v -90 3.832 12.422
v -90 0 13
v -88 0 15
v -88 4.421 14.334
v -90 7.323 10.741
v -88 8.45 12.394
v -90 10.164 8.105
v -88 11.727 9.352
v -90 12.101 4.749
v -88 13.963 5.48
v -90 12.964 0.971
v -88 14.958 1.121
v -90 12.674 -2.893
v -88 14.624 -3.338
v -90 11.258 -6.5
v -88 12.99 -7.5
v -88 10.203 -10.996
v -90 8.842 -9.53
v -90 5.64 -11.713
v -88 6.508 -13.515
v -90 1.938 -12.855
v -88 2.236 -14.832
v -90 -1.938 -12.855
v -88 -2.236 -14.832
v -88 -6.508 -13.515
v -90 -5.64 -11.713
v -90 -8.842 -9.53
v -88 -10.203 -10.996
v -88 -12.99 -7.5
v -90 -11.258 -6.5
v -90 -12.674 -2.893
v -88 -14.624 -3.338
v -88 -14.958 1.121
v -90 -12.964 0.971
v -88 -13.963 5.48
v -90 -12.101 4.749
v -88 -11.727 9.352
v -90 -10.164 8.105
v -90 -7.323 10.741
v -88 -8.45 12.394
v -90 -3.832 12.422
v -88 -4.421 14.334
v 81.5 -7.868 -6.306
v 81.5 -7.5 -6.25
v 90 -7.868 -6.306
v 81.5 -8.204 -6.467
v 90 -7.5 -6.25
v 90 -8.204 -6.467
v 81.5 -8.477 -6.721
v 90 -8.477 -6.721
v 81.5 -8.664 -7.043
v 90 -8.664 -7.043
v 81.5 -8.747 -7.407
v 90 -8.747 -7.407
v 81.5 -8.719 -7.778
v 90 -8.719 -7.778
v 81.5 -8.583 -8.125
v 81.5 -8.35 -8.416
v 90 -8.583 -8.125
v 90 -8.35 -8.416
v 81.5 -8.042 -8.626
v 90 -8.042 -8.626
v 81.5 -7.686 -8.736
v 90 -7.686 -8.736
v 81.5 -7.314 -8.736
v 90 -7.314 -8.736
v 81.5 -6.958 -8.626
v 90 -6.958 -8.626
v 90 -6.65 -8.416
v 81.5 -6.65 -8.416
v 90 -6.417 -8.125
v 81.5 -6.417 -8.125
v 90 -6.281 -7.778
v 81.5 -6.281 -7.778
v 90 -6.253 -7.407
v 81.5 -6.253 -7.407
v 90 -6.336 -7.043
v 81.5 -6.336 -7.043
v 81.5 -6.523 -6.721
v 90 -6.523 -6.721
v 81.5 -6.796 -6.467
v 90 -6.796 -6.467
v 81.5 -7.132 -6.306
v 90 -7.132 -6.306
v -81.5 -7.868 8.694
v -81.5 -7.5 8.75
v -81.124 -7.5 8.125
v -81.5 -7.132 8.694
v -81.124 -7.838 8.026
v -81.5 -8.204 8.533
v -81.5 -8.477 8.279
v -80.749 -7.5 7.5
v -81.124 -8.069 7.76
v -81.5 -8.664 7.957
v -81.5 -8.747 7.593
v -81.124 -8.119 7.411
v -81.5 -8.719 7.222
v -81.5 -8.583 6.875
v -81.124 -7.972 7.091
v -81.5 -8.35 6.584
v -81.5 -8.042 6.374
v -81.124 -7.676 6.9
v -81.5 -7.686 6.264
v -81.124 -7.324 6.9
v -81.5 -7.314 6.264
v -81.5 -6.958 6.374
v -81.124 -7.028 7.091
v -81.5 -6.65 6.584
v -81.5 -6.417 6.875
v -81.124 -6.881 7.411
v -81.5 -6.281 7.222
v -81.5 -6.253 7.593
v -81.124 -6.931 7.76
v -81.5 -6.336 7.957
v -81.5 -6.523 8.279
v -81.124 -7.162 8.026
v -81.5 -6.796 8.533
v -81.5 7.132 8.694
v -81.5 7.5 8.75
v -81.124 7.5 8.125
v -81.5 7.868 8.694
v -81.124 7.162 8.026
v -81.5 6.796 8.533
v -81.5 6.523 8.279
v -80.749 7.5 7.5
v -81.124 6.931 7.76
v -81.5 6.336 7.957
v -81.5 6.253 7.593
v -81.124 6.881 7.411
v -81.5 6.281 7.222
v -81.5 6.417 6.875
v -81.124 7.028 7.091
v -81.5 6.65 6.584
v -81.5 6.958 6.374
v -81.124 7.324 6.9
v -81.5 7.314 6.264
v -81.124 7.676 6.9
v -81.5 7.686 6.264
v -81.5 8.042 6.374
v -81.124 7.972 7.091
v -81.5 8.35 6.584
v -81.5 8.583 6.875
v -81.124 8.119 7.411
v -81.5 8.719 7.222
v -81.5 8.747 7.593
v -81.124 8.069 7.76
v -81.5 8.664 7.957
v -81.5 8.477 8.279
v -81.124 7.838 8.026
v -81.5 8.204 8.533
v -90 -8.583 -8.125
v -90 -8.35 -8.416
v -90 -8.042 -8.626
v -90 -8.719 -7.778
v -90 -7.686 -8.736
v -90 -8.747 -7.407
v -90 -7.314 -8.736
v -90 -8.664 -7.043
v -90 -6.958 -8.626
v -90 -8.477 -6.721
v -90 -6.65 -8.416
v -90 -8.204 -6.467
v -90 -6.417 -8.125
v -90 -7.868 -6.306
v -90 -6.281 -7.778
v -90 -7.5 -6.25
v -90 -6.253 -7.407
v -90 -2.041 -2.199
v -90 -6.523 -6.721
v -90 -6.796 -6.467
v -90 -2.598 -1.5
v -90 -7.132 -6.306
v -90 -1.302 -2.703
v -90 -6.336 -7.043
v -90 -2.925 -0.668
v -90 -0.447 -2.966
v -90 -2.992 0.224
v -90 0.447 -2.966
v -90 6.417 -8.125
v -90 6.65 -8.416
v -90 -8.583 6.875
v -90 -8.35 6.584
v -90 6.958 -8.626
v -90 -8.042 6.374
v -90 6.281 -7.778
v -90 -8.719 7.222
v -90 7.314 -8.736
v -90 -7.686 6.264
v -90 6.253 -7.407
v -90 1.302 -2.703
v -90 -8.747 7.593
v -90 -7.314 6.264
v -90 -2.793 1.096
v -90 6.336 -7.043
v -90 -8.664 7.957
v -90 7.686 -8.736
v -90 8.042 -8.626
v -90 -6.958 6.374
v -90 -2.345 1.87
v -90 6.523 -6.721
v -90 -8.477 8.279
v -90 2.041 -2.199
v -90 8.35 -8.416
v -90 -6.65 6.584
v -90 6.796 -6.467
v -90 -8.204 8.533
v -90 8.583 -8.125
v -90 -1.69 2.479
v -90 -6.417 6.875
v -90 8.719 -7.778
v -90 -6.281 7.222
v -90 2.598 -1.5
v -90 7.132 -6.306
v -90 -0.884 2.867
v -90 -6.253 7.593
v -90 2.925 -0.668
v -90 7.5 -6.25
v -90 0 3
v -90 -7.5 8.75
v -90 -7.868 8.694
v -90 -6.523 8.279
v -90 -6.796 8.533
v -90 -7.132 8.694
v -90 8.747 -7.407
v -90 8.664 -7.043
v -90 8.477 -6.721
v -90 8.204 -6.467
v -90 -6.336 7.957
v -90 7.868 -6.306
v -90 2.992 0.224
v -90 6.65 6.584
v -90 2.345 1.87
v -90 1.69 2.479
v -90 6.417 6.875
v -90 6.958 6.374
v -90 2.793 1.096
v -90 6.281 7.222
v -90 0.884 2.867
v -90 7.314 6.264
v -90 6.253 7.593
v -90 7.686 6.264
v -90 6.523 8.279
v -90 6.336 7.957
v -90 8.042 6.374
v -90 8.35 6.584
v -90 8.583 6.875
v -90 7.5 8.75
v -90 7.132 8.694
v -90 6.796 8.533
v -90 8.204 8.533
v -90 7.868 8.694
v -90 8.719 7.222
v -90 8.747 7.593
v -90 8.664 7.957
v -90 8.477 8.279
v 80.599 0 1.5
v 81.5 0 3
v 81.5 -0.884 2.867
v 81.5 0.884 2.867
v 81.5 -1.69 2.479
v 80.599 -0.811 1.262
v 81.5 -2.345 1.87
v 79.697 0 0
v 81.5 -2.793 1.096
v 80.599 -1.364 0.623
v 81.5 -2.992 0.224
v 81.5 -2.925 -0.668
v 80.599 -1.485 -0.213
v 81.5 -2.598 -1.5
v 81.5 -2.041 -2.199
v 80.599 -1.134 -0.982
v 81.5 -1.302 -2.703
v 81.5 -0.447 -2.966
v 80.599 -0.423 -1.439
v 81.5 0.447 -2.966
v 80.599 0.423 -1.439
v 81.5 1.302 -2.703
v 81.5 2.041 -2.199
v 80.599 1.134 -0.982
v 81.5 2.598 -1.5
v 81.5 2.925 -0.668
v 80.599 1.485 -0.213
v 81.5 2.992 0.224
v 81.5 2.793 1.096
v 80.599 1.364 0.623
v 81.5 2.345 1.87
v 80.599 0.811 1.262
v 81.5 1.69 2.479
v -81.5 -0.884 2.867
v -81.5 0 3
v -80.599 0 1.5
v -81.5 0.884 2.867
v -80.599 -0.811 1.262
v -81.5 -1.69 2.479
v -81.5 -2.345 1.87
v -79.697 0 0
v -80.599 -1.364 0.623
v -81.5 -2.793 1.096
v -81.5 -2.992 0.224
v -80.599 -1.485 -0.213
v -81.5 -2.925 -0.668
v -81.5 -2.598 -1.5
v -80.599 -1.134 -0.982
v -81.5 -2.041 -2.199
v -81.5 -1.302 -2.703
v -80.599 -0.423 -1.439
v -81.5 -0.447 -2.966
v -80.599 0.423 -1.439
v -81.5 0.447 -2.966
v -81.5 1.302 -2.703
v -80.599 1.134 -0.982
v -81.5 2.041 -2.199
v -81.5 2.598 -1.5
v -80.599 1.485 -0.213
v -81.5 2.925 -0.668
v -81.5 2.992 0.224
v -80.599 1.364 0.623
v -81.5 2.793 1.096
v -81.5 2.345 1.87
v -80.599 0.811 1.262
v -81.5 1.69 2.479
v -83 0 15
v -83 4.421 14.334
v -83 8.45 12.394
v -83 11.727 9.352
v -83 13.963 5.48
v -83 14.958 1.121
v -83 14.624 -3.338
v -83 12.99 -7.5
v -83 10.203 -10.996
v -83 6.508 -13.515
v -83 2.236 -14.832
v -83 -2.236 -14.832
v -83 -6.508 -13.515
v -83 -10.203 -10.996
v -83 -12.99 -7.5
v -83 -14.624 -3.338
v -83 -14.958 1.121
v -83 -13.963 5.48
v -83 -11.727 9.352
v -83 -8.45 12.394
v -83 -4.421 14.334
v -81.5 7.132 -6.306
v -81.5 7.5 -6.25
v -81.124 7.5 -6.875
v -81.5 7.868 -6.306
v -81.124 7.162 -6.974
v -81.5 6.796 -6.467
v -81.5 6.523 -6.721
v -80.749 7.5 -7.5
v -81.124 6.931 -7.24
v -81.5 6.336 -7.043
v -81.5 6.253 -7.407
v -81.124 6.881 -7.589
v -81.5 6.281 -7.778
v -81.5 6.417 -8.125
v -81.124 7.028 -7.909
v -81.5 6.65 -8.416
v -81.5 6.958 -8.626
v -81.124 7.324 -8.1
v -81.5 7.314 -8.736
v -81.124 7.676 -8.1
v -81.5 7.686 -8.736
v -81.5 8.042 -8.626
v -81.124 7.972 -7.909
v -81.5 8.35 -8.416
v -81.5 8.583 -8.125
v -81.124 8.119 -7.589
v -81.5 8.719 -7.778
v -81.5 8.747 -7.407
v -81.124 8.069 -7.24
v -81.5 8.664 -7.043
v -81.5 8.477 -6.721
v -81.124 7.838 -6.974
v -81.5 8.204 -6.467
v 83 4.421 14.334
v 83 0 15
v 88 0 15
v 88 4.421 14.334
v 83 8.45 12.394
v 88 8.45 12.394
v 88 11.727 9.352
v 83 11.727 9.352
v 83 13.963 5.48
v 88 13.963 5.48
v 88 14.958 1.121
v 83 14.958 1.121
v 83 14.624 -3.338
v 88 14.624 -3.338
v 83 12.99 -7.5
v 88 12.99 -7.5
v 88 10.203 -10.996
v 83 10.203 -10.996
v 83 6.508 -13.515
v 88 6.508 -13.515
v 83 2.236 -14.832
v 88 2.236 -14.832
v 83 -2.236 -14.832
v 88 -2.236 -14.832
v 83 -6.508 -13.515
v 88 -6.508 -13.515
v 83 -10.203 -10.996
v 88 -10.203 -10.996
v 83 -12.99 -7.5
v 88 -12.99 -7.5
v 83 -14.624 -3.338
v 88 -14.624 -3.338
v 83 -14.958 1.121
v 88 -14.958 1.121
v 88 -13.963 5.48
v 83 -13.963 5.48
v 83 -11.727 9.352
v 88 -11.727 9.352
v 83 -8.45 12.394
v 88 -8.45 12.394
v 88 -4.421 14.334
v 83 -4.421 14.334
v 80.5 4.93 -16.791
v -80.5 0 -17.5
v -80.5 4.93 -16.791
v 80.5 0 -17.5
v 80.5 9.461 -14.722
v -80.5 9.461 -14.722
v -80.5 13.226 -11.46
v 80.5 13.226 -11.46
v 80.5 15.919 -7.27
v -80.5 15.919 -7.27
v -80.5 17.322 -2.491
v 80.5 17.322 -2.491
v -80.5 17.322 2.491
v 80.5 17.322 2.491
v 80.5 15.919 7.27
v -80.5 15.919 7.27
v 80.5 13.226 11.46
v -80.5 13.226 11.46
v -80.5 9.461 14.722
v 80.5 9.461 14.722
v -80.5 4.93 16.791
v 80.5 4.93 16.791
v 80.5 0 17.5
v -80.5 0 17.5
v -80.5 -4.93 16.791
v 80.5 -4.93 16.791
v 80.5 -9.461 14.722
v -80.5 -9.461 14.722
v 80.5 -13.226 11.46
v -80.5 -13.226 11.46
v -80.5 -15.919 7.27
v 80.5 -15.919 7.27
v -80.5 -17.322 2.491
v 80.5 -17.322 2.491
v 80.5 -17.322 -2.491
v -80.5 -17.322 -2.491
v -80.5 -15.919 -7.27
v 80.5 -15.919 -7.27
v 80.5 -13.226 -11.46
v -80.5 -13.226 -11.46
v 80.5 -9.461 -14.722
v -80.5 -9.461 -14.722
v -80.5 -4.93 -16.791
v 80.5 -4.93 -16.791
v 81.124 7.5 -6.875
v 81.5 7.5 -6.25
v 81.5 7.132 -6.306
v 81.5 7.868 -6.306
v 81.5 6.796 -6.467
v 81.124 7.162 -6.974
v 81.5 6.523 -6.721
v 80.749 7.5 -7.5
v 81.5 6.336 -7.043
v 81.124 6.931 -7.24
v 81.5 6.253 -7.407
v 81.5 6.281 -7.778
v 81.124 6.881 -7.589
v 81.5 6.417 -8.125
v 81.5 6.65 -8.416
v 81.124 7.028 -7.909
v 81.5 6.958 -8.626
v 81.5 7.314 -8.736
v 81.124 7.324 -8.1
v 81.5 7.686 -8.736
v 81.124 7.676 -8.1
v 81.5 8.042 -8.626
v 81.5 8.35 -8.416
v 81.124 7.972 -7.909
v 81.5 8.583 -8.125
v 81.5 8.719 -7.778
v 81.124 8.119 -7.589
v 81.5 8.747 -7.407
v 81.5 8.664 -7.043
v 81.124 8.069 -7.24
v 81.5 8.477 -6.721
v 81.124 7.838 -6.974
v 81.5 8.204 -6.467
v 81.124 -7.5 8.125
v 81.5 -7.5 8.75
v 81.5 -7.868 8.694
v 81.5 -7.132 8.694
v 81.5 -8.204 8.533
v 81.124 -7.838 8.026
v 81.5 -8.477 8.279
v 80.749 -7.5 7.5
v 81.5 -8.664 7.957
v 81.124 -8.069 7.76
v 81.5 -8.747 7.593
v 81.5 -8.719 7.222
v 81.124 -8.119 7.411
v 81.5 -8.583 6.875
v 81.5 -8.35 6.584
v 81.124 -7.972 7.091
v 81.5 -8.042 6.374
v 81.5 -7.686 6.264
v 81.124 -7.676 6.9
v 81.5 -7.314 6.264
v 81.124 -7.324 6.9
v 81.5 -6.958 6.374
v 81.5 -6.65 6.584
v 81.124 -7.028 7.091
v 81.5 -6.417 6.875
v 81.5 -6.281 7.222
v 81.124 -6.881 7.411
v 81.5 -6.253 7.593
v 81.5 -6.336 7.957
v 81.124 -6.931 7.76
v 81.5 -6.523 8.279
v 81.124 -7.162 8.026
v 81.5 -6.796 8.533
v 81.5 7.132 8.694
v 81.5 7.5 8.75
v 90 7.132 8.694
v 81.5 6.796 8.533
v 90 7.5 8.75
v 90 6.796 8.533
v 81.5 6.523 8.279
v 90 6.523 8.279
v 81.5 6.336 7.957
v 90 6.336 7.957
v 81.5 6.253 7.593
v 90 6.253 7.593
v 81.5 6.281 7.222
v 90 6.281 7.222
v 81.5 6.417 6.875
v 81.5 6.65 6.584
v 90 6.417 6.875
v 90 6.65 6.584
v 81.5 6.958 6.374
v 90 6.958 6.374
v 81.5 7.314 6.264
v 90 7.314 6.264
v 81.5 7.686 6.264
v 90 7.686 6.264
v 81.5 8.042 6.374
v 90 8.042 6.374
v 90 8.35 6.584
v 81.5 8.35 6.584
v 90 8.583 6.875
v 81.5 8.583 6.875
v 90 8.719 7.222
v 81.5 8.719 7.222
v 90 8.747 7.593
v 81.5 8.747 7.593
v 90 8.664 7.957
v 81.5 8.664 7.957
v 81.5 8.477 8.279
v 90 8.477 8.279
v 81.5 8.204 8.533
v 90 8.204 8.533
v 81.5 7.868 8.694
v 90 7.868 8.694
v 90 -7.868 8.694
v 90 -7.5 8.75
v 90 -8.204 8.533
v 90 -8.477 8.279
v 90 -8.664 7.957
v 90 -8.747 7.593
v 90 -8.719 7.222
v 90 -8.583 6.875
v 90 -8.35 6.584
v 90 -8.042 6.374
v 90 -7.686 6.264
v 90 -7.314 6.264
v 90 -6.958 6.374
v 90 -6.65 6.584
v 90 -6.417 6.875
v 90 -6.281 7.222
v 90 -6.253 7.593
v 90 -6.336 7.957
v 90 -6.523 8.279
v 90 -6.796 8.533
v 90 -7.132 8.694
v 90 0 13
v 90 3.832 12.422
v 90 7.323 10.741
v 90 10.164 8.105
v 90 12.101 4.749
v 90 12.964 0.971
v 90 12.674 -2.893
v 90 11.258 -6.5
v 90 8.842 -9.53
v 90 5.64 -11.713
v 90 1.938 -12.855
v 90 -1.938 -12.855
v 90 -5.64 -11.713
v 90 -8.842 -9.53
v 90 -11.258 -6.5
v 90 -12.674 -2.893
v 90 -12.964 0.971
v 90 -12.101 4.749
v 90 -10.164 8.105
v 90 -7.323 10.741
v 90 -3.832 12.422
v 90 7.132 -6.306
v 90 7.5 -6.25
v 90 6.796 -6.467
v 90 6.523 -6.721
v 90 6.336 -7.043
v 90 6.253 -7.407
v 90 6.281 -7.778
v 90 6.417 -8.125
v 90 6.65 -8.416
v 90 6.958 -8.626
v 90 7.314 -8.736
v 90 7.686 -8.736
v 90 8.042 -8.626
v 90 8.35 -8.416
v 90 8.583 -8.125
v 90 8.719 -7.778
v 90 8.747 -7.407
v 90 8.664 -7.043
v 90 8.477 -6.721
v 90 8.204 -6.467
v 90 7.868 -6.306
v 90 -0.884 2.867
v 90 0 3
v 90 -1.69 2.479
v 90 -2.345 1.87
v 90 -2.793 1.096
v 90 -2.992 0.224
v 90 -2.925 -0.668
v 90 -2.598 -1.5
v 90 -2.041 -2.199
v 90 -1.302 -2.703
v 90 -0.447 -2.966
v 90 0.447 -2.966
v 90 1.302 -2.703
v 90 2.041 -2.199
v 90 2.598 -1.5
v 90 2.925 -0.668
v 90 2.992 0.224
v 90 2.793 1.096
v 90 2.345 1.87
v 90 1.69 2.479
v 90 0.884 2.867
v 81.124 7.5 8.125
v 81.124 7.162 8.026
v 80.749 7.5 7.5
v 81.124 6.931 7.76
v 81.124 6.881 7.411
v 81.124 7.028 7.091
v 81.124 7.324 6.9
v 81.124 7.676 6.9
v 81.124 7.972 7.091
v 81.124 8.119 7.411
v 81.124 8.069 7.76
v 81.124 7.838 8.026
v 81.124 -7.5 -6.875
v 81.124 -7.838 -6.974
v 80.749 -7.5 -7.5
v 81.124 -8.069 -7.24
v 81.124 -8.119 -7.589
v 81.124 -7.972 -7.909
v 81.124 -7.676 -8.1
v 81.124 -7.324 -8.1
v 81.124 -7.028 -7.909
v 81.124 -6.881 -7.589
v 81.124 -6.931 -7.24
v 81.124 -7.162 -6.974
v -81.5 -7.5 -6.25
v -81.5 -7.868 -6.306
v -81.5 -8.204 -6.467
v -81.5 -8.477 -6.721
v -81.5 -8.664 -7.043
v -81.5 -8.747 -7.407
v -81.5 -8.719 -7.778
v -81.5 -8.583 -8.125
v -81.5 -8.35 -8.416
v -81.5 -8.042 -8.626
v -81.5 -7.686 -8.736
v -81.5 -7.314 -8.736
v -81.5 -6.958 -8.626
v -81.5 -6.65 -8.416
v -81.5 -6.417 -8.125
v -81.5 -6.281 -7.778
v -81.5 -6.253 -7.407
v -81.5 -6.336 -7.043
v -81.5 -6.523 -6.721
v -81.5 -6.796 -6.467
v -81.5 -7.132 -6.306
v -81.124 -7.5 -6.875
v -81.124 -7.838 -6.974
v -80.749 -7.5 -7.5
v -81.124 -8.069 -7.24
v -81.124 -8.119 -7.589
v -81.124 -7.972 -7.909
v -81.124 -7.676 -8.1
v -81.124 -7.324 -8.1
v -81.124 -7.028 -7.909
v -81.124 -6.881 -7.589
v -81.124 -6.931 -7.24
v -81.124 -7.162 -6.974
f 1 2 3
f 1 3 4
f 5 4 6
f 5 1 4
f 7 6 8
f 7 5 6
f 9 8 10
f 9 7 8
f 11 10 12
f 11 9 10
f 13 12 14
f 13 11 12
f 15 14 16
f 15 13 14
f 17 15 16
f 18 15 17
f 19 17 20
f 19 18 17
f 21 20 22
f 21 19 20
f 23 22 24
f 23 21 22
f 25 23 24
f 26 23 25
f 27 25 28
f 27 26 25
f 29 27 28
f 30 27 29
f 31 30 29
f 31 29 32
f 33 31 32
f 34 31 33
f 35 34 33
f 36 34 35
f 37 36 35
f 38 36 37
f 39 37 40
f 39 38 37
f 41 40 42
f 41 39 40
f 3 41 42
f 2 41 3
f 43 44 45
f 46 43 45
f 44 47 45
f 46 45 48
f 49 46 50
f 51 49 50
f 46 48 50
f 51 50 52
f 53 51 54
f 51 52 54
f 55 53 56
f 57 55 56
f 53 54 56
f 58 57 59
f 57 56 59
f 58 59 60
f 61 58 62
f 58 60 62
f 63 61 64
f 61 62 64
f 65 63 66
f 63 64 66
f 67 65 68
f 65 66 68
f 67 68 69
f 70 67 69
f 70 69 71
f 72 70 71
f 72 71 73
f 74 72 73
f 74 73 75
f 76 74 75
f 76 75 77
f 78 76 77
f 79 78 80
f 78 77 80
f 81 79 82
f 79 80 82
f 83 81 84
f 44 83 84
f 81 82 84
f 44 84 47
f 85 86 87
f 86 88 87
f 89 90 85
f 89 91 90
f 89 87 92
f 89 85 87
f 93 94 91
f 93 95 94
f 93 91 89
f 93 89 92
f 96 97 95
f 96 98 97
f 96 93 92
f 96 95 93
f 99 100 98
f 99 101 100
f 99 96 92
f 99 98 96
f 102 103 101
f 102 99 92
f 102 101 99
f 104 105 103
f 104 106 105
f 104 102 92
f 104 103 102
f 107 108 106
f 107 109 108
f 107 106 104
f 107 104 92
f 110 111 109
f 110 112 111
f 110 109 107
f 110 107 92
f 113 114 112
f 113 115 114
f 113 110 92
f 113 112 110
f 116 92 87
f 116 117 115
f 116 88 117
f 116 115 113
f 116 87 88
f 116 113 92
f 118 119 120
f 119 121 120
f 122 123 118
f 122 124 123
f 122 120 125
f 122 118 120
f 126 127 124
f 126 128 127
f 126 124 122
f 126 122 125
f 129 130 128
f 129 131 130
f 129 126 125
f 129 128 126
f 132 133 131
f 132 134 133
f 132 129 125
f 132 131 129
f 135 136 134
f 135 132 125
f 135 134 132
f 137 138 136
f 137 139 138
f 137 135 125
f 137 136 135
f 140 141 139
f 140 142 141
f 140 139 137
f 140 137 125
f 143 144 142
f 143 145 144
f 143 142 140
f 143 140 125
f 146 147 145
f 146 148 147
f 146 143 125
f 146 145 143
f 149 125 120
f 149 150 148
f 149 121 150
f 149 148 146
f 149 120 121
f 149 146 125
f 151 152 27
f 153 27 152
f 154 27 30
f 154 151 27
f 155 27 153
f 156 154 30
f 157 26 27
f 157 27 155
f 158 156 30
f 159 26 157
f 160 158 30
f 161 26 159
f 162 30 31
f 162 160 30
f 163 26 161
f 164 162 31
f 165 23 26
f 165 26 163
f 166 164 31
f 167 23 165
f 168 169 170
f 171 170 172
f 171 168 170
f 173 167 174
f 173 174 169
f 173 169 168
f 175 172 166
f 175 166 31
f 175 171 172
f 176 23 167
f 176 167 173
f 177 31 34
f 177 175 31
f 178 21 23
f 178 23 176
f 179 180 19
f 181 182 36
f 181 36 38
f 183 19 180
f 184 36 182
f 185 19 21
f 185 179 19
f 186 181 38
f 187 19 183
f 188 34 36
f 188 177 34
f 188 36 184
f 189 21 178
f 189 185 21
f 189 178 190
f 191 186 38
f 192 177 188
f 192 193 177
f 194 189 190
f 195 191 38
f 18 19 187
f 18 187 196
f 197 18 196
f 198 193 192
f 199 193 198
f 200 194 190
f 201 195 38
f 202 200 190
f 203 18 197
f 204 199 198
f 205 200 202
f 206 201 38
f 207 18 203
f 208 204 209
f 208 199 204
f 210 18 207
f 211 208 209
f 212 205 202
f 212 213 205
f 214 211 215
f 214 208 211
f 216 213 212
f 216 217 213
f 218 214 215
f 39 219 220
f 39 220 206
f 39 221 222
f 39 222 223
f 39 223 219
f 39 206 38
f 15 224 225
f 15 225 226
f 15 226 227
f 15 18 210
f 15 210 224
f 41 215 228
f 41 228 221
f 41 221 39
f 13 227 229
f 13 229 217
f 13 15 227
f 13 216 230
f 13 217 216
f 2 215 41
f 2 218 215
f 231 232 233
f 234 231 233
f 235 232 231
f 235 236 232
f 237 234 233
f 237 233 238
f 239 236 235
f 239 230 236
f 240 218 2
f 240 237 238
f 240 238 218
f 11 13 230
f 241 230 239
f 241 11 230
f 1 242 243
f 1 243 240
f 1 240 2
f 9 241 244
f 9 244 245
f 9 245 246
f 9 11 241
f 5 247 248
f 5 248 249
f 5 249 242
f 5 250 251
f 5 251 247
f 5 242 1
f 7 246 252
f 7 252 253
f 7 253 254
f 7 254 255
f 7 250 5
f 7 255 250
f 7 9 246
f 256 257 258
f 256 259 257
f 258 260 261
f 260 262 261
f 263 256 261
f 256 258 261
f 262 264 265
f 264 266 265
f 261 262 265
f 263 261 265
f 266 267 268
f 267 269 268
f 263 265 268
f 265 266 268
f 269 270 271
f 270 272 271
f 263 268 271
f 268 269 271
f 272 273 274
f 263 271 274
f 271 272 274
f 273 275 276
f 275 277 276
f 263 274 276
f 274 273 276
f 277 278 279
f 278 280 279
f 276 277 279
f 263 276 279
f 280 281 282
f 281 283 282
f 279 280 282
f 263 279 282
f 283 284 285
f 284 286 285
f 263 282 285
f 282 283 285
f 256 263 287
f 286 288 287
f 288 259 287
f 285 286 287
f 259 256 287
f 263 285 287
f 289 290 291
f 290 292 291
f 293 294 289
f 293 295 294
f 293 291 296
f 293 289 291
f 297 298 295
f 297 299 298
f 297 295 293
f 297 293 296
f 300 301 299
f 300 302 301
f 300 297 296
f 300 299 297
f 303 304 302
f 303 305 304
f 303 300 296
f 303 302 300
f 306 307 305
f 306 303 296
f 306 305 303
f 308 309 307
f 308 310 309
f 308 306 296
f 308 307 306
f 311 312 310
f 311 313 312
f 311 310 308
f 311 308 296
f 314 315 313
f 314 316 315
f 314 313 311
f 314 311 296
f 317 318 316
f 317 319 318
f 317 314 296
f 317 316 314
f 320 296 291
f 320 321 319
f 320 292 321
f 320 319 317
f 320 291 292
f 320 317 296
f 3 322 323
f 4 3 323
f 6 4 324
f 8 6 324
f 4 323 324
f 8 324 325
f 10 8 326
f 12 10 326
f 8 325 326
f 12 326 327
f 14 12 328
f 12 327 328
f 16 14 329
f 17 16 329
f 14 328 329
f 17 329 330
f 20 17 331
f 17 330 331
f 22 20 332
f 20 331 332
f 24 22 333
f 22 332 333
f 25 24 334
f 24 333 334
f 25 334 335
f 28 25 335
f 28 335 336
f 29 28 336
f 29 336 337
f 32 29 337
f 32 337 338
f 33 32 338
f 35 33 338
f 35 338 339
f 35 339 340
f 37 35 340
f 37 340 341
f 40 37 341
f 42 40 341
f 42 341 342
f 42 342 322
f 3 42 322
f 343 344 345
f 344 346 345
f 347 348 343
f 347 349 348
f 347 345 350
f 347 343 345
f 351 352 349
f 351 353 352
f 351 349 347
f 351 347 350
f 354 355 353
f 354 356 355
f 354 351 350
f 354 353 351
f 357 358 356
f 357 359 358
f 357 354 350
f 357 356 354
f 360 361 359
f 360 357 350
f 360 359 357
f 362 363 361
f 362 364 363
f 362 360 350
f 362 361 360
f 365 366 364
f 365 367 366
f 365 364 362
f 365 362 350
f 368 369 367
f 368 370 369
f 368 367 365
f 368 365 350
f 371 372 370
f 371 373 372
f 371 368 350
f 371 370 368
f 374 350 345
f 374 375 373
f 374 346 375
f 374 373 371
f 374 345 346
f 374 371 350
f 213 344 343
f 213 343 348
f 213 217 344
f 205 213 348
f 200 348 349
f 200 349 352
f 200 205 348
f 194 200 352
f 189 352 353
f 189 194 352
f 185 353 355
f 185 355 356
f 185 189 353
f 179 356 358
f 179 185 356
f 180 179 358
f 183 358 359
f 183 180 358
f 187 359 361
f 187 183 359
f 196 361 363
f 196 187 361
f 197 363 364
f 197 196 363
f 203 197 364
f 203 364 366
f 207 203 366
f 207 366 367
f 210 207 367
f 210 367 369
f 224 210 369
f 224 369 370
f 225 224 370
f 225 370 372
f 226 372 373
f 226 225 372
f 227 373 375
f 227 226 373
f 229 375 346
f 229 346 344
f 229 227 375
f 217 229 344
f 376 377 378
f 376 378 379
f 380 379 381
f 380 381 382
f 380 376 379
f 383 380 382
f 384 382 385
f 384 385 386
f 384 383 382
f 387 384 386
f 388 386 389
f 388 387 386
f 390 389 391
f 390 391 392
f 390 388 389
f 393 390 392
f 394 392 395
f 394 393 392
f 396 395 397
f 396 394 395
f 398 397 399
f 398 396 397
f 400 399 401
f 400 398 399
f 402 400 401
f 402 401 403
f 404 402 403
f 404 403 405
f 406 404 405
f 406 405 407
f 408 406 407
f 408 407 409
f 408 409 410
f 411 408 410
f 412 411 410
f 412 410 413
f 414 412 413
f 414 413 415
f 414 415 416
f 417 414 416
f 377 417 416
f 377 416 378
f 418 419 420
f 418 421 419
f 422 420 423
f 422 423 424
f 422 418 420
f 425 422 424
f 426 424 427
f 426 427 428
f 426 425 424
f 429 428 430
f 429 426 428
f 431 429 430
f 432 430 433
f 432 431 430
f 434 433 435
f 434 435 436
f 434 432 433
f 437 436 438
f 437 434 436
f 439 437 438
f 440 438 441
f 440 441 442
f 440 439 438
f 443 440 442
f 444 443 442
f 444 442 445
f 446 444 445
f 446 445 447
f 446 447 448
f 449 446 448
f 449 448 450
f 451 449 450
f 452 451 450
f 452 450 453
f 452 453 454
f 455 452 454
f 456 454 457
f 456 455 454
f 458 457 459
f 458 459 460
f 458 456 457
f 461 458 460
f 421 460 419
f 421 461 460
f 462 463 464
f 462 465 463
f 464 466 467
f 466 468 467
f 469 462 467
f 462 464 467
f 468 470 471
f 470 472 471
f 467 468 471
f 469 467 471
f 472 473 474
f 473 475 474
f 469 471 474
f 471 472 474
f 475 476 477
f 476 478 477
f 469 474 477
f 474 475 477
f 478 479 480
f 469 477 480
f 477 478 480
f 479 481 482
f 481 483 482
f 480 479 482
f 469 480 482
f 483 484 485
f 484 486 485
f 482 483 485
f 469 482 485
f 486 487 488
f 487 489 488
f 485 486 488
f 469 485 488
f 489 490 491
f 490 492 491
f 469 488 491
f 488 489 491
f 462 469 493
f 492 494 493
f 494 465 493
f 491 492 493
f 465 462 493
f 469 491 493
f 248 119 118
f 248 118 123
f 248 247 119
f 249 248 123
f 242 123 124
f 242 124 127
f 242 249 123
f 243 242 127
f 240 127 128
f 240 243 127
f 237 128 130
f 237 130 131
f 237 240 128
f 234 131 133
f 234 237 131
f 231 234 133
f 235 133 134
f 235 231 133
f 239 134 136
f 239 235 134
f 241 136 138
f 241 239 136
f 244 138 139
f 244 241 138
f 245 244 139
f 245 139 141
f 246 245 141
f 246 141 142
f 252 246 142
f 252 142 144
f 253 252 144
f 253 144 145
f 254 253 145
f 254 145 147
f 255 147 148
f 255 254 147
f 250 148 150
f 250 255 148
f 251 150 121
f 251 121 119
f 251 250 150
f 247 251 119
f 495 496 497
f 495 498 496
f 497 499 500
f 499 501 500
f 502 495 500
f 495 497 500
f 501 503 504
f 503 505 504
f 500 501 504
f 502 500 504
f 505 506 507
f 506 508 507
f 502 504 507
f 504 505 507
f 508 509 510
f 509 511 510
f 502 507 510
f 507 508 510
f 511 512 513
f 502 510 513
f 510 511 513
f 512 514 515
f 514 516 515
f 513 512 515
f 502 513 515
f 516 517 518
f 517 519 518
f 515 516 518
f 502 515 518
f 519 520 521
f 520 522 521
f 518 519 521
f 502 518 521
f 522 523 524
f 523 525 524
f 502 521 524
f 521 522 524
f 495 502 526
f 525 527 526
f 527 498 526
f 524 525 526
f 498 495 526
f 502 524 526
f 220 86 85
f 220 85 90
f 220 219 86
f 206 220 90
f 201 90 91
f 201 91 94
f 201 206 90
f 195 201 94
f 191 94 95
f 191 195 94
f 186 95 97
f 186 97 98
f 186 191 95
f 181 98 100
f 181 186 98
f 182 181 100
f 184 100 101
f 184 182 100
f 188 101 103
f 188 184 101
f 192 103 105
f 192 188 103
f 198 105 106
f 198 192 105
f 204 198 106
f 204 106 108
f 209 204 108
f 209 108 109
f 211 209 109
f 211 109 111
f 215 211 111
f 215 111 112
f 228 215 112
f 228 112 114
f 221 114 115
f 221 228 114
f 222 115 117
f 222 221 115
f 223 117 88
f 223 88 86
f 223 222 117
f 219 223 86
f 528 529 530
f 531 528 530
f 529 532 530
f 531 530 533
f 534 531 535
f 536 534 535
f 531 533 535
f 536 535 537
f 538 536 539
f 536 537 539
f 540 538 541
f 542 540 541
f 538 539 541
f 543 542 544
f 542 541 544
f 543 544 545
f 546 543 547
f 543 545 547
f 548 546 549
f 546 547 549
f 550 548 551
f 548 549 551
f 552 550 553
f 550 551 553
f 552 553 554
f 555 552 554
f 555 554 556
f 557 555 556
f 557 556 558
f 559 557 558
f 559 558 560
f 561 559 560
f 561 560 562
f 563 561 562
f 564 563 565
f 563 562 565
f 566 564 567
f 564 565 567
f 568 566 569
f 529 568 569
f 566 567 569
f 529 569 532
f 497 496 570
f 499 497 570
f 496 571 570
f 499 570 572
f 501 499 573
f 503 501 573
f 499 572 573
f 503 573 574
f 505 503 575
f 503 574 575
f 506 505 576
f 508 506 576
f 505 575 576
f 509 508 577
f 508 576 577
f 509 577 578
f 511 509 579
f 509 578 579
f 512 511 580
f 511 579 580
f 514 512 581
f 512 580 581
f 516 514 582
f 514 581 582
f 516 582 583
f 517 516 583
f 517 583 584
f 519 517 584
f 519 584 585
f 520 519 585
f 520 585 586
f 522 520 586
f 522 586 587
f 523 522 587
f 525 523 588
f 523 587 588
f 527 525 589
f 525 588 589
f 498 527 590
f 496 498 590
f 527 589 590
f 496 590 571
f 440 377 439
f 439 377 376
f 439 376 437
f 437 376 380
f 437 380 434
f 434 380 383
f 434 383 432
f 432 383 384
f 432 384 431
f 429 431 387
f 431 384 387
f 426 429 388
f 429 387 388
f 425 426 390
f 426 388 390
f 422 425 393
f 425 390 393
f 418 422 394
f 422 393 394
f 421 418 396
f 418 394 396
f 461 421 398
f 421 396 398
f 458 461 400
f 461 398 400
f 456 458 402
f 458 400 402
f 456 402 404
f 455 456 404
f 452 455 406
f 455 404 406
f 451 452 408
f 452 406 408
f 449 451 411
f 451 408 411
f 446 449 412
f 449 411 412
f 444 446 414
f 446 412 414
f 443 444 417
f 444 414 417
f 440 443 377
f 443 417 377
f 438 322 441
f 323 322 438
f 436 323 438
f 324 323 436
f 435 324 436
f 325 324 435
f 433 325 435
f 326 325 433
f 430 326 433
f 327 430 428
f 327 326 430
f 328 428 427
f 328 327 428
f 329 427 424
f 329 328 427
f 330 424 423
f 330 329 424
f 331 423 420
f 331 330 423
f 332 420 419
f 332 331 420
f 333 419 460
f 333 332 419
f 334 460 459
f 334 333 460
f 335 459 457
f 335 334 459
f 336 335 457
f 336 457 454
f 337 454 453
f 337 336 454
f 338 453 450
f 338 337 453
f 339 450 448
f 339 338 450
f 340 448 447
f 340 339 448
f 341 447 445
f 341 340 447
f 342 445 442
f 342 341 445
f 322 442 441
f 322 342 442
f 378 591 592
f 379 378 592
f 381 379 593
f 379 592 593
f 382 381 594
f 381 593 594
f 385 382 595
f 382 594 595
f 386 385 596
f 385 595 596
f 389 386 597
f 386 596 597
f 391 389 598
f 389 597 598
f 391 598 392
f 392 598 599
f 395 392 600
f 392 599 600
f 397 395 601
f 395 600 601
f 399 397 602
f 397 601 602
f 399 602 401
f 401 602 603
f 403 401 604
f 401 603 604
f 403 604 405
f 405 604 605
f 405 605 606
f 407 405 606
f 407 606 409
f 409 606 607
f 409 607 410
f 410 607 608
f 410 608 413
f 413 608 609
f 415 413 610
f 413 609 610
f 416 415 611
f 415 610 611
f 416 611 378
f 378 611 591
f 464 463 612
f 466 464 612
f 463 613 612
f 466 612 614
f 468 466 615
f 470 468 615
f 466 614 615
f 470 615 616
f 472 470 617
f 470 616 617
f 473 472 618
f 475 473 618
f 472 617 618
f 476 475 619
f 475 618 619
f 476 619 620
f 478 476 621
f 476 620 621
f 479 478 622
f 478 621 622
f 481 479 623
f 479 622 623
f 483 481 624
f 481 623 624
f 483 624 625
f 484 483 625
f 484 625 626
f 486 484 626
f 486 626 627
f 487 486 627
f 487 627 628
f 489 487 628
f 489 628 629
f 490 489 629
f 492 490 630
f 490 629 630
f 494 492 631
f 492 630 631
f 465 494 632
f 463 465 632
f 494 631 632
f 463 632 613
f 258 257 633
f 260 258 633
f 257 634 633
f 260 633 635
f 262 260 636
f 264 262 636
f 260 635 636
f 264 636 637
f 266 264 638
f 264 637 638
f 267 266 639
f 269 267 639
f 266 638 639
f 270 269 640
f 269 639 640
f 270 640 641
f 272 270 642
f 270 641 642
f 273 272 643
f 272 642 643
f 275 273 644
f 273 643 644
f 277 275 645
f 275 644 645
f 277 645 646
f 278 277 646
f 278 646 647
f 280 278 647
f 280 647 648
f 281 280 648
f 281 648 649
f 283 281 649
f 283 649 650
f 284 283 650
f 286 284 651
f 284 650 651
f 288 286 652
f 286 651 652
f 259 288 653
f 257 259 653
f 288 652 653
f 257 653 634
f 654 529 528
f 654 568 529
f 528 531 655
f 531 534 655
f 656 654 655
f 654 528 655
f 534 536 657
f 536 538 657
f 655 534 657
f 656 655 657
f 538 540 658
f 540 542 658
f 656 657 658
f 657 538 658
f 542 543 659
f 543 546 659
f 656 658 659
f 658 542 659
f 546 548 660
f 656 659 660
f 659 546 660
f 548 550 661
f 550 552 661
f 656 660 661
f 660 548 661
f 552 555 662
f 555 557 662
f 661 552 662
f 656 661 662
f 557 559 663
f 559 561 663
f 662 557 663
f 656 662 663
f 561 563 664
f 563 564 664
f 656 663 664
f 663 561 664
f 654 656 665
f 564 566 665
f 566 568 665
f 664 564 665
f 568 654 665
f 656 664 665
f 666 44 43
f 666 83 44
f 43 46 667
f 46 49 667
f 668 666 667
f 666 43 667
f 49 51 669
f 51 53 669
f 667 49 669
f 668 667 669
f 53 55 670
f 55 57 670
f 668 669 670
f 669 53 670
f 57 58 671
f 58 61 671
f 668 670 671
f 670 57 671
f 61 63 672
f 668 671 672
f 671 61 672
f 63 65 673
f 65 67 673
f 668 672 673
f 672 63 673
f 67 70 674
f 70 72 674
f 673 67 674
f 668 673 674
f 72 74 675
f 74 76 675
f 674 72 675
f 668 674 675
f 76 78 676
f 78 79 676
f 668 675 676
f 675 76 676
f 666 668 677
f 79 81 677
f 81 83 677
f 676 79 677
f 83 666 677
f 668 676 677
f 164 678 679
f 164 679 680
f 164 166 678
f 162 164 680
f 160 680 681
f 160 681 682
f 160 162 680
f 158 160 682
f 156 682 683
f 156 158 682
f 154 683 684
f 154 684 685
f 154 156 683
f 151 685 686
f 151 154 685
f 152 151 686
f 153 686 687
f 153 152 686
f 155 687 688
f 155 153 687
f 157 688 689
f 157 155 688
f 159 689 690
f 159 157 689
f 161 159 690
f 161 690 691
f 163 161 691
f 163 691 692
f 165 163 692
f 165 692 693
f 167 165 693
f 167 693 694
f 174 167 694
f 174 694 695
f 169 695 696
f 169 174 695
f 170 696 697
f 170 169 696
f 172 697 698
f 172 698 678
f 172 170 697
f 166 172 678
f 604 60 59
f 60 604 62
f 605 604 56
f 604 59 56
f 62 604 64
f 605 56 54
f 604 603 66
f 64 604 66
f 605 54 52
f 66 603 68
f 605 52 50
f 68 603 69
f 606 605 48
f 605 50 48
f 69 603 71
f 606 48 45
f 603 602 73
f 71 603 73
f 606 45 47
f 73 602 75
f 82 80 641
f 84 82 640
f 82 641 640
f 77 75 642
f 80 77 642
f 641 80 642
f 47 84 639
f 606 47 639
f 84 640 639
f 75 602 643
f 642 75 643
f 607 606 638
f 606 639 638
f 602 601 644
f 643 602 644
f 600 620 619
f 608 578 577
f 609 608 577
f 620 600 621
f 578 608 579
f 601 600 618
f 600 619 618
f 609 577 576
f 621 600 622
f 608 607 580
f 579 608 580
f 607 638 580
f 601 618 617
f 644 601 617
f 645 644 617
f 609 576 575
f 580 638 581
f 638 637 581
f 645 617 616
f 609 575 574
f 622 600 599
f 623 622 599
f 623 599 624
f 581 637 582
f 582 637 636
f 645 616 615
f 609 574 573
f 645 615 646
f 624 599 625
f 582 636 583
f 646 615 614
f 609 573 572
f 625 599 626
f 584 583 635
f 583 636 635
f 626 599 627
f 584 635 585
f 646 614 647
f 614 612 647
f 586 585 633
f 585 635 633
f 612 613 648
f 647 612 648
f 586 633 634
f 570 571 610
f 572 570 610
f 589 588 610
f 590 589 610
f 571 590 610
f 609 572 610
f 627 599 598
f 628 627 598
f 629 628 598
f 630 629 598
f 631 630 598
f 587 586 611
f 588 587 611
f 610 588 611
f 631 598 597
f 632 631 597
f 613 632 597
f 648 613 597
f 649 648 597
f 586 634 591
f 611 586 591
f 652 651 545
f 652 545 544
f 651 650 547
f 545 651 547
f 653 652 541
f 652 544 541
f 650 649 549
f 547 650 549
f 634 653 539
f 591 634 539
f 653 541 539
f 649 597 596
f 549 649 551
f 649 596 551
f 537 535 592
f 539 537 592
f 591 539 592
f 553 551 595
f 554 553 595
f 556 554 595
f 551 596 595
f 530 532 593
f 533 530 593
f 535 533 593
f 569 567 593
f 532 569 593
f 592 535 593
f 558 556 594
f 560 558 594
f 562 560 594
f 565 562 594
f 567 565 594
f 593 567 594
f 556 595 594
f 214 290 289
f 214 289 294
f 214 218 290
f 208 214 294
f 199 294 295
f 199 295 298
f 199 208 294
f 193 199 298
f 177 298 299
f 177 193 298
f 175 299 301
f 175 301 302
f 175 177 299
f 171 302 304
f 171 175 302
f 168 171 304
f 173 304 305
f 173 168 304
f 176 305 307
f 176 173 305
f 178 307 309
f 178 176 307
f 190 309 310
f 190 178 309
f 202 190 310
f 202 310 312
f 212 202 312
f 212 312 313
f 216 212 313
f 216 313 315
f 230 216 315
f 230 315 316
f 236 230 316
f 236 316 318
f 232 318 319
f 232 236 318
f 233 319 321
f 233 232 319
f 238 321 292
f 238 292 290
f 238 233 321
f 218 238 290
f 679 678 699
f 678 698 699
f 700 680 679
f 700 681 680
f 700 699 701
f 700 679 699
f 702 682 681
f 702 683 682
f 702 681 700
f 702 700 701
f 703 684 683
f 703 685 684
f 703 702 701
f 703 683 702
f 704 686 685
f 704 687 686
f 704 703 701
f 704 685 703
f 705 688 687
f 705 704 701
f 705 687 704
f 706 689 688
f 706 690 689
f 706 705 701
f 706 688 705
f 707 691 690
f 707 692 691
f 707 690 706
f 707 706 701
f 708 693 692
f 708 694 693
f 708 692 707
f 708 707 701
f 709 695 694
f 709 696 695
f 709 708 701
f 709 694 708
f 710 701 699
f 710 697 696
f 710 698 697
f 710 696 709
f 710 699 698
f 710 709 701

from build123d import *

# Parameters (mm, degrees)
SKETCH1_R                  = 17.5
BOSS_EXTRUDE1_DEPTH        = 80
SKETCH7_R                  = 15
BOSS_EXTRUDE2_DEPTH        = 10
CHAMFER1_SIZE              = 3
CHAMFER2_SIZE              = 2
M3_TAPPED_HOLE1_AT_2_COUNT = 2
M3_TAPPED_HOLE1_AT_2_PITCH = 15
M3_TAPPED_HOLE1_AT_3_COUNT = 2
M3_TAPPED_HOLE1_AT_3_PITCH = 21.213203436
M3_TAPPED_HOLE1_AT_4_COUNT = 2
M3_TAPPED_HOLE1_AT_4_PITCH = 15


with BuildPart() as part:
    # Sketch1 → Boss-Extrude1 (new, symmetric)
    with BuildSketch(Plane(origin=(0, 0, 0), x_dir=(0, 0, -1), z_dir=(1, 0, 0))):
        Circle(SKETCH1_R)
    extrude(amount=BOSS_EXTRUDE1_DEPTH, both=True)

    # Sketch7 → Boss-Extrude2 (add)
    with BuildSketch(Plane.ZY.offset(80)):
        Circle(SKETCH7_R)
    boss_extrude2 = extrude(amount=BOSS_EXTRUDE2_DEPTH)

    # Mirror3: Boss-Extrude2 across plane
    add(boss_extrude2.mirror(Plane(origin=(0, 0, 0), x_dir=(0, 0, 1), z_dir=(1, 0, 0))))

    # Chamfer1
    # the kernel refuses this chamfer: 3 mm, written as the material it adds along each edge
    with BuildSketch(Plane(origin=(80, 0, 0), x_dir=(0, 0, 1), z_dir=(0, -1, 0))) as chamfer1_piece_1_section:
        Polygon((15 + CHAMFER1_SIZE, 0), (15, -CHAMFER1_SIZE), (15, 0), align=None)
    chamfer1_piece_1 = revolve(axis=Axis((80, 0, 0), (-1, 0, 0)), mode=Mode.PRIVATE)
    chamfer1_piece_1 = chamfer1_piece_1 & Plane(origin=(81.737216011, 0, 0), x_dir=(0, 0, -1), z_dir=(1, 0, 0)) * Cylinder(17.5, 72, mode=Mode.PRIVATE)
    add(chamfer1_piece_1)
    with BuildSketch(Plane(origin=(-80, 0, 0), x_dir=(0, 0, 1), z_dir=(0, -1, 0))) as chamfer1_piece_2_section:
        Polygon((15 + CHAMFER1_SIZE, 0), (15, CHAMFER1_SIZE), (15, 0), align=None)
    chamfer1_piece_2 = revolve(axis=Axis((-80, 0, 0), (-1, 0, 0)), mode=Mode.PRIVATE)
    chamfer1_piece_2 = chamfer1_piece_2 & Plane(origin=(-81.737216011, 0, 0), x_dir=(0, 0, -1), z_dir=(1, 0, 0)) * Cylinder(17.5, 72, mode=Mode.PRIVATE)
    add(chamfer1_piece_2)

    # Chamfer2
    chamfer2_edges = [part.edges().sort_by_distance(p)[0] for p in [
        (90, 0, -15),
        (-90, 0, -15),
    ]]
    chamfer(chamfer2_edges, length=CHAMFER2_SIZE)

    # Sketch9 → M3 Tapped Hole1 (revolve, cut)
    with BuildSketch(Plane(origin=(-90, 7.5, -7.5), x_dir=(0, 0, 1), z_dir=(0, 1, 0))):
        Polygon((0, 0), (0, 9.251075774), (1.25, 8.5), (1.25, 0), align=None)
    m3_tapped_hole1 = revolve(axis=Axis((-96.35, 7.5, -7.5), (1, 0, 0)), mode=Mode.SUBTRACT)

    # M3 Tapped Hole1 at 2: M3 Tapped Hole1 ×2
    with Locations(*[(0, 0, i * M3_TAPPED_HOLE1_AT_2_PITCH) for i in range(1, M3_TAPPED_HOLE1_AT_2_COUNT)]):
        add(m3_tapped_hole1, mode=Mode.SUBTRACT)

    # M3 Tapped Hole1 at 3: M3 Tapped Hole1 ×2
    with Locations(*[Vector(0, -0.7071067811865476, 0.7071067811865475) * (i * M3_TAPPED_HOLE1_AT_3_PITCH) for i in range(1, M3_TAPPED_HOLE1_AT_3_COUNT)]):
        add(m3_tapped_hole1, mode=Mode.SUBTRACT)

    # M3 Tapped Hole1 at 4: M3 Tapped Hole1 ×2
    with Locations(*[(0, -i * M3_TAPPED_HOLE1_AT_4_PITCH, 0) for i in range(1, M3_TAPPED_HOLE1_AT_4_COUNT)]):
        add(m3_tapped_hole1, mode=Mode.SUBTRACT)

    # Sketch11 → Ø6.0mm Dowel Hole1 (revolve, cut)
    with BuildSketch(Plane(origin=(-90, 0, 0), x_dir=(0, 0, 1), z_dir=(0, 1, 0))):
        Polygon((0, 0), (0, 10.302581857), (3, 8.5), (3, 0), align=None)
    f_6_0mm_dowel_hole1 = revolve(axis=Axis((-96.35, 0, 0), (1, 0, 0)), mode=Mode.SUBTRACT)

    # Mirror4: M3 Tapped Hole1, Ø6.0mm Dowel Hole1 across plane
    add(m3_tapped_hole1.mirror(Plane(origin=(0, 0, 0), x_dir=(0, 0, 1), z_dir=(1, 0, 0))), mode=Mode.SUBTRACT)
    add(f_6_0mm_dowel_hole1.mirror(Plane(origin=(0, 0, 0), x_dir=(0, 0, 1), z_dir=(1, 0, 0))), mode=Mode.SUBTRACT)

    # Mirror4 copy 1 sketch → Mirror4 copy 1 (revolve, cut)
    with BuildSketch(Plane(origin=(90, 7.5, 7.5), x_dir=(0, 0, 1), z_dir=(0, 1, 0))):
        Polygon((0, 0), (0, -9.251075774), (1.25, -8.5), (1.25, 0), align=None)
    revolve(axis=Axis((96.35, 7.5, 7.5), (1, 0, 0)), mode=Mode.SUBTRACT)

    # Mirror4 copy 2 sketch → Mirror4 copy 2 (revolve, cut)
    with BuildSketch(Plane(origin=(90, -7.5, 7.5), x_dir=(0, 0, 1), z_dir=(0, 1, 0))):
        Polygon((0, 0), (0, -9.251075774), (1.25, -8.5), (1.25, 0), align=None)
    revolve(axis=Axis((96.35, -7.5, 7.5), (1, 0, 0)), mode=Mode.SUBTRACT)

    # Mirror4 copy 3 sketch → Mirror4 copy 3 (revolve, cut)
    with BuildSketch(Plane(origin=(90, -7.5, -7.5), x_dir=(0, 0, 1), z_dir=(0, 1, 0))):
        Polygon((0, 0), (0, -9.251075774), (1.25, -8.5), (1.25, 0), align=None)
    revolve(axis=Axis((96.35, -7.5, -7.5), (1, 0, 0)), mode=Mode.SUBTRACT)


solid = part.part
